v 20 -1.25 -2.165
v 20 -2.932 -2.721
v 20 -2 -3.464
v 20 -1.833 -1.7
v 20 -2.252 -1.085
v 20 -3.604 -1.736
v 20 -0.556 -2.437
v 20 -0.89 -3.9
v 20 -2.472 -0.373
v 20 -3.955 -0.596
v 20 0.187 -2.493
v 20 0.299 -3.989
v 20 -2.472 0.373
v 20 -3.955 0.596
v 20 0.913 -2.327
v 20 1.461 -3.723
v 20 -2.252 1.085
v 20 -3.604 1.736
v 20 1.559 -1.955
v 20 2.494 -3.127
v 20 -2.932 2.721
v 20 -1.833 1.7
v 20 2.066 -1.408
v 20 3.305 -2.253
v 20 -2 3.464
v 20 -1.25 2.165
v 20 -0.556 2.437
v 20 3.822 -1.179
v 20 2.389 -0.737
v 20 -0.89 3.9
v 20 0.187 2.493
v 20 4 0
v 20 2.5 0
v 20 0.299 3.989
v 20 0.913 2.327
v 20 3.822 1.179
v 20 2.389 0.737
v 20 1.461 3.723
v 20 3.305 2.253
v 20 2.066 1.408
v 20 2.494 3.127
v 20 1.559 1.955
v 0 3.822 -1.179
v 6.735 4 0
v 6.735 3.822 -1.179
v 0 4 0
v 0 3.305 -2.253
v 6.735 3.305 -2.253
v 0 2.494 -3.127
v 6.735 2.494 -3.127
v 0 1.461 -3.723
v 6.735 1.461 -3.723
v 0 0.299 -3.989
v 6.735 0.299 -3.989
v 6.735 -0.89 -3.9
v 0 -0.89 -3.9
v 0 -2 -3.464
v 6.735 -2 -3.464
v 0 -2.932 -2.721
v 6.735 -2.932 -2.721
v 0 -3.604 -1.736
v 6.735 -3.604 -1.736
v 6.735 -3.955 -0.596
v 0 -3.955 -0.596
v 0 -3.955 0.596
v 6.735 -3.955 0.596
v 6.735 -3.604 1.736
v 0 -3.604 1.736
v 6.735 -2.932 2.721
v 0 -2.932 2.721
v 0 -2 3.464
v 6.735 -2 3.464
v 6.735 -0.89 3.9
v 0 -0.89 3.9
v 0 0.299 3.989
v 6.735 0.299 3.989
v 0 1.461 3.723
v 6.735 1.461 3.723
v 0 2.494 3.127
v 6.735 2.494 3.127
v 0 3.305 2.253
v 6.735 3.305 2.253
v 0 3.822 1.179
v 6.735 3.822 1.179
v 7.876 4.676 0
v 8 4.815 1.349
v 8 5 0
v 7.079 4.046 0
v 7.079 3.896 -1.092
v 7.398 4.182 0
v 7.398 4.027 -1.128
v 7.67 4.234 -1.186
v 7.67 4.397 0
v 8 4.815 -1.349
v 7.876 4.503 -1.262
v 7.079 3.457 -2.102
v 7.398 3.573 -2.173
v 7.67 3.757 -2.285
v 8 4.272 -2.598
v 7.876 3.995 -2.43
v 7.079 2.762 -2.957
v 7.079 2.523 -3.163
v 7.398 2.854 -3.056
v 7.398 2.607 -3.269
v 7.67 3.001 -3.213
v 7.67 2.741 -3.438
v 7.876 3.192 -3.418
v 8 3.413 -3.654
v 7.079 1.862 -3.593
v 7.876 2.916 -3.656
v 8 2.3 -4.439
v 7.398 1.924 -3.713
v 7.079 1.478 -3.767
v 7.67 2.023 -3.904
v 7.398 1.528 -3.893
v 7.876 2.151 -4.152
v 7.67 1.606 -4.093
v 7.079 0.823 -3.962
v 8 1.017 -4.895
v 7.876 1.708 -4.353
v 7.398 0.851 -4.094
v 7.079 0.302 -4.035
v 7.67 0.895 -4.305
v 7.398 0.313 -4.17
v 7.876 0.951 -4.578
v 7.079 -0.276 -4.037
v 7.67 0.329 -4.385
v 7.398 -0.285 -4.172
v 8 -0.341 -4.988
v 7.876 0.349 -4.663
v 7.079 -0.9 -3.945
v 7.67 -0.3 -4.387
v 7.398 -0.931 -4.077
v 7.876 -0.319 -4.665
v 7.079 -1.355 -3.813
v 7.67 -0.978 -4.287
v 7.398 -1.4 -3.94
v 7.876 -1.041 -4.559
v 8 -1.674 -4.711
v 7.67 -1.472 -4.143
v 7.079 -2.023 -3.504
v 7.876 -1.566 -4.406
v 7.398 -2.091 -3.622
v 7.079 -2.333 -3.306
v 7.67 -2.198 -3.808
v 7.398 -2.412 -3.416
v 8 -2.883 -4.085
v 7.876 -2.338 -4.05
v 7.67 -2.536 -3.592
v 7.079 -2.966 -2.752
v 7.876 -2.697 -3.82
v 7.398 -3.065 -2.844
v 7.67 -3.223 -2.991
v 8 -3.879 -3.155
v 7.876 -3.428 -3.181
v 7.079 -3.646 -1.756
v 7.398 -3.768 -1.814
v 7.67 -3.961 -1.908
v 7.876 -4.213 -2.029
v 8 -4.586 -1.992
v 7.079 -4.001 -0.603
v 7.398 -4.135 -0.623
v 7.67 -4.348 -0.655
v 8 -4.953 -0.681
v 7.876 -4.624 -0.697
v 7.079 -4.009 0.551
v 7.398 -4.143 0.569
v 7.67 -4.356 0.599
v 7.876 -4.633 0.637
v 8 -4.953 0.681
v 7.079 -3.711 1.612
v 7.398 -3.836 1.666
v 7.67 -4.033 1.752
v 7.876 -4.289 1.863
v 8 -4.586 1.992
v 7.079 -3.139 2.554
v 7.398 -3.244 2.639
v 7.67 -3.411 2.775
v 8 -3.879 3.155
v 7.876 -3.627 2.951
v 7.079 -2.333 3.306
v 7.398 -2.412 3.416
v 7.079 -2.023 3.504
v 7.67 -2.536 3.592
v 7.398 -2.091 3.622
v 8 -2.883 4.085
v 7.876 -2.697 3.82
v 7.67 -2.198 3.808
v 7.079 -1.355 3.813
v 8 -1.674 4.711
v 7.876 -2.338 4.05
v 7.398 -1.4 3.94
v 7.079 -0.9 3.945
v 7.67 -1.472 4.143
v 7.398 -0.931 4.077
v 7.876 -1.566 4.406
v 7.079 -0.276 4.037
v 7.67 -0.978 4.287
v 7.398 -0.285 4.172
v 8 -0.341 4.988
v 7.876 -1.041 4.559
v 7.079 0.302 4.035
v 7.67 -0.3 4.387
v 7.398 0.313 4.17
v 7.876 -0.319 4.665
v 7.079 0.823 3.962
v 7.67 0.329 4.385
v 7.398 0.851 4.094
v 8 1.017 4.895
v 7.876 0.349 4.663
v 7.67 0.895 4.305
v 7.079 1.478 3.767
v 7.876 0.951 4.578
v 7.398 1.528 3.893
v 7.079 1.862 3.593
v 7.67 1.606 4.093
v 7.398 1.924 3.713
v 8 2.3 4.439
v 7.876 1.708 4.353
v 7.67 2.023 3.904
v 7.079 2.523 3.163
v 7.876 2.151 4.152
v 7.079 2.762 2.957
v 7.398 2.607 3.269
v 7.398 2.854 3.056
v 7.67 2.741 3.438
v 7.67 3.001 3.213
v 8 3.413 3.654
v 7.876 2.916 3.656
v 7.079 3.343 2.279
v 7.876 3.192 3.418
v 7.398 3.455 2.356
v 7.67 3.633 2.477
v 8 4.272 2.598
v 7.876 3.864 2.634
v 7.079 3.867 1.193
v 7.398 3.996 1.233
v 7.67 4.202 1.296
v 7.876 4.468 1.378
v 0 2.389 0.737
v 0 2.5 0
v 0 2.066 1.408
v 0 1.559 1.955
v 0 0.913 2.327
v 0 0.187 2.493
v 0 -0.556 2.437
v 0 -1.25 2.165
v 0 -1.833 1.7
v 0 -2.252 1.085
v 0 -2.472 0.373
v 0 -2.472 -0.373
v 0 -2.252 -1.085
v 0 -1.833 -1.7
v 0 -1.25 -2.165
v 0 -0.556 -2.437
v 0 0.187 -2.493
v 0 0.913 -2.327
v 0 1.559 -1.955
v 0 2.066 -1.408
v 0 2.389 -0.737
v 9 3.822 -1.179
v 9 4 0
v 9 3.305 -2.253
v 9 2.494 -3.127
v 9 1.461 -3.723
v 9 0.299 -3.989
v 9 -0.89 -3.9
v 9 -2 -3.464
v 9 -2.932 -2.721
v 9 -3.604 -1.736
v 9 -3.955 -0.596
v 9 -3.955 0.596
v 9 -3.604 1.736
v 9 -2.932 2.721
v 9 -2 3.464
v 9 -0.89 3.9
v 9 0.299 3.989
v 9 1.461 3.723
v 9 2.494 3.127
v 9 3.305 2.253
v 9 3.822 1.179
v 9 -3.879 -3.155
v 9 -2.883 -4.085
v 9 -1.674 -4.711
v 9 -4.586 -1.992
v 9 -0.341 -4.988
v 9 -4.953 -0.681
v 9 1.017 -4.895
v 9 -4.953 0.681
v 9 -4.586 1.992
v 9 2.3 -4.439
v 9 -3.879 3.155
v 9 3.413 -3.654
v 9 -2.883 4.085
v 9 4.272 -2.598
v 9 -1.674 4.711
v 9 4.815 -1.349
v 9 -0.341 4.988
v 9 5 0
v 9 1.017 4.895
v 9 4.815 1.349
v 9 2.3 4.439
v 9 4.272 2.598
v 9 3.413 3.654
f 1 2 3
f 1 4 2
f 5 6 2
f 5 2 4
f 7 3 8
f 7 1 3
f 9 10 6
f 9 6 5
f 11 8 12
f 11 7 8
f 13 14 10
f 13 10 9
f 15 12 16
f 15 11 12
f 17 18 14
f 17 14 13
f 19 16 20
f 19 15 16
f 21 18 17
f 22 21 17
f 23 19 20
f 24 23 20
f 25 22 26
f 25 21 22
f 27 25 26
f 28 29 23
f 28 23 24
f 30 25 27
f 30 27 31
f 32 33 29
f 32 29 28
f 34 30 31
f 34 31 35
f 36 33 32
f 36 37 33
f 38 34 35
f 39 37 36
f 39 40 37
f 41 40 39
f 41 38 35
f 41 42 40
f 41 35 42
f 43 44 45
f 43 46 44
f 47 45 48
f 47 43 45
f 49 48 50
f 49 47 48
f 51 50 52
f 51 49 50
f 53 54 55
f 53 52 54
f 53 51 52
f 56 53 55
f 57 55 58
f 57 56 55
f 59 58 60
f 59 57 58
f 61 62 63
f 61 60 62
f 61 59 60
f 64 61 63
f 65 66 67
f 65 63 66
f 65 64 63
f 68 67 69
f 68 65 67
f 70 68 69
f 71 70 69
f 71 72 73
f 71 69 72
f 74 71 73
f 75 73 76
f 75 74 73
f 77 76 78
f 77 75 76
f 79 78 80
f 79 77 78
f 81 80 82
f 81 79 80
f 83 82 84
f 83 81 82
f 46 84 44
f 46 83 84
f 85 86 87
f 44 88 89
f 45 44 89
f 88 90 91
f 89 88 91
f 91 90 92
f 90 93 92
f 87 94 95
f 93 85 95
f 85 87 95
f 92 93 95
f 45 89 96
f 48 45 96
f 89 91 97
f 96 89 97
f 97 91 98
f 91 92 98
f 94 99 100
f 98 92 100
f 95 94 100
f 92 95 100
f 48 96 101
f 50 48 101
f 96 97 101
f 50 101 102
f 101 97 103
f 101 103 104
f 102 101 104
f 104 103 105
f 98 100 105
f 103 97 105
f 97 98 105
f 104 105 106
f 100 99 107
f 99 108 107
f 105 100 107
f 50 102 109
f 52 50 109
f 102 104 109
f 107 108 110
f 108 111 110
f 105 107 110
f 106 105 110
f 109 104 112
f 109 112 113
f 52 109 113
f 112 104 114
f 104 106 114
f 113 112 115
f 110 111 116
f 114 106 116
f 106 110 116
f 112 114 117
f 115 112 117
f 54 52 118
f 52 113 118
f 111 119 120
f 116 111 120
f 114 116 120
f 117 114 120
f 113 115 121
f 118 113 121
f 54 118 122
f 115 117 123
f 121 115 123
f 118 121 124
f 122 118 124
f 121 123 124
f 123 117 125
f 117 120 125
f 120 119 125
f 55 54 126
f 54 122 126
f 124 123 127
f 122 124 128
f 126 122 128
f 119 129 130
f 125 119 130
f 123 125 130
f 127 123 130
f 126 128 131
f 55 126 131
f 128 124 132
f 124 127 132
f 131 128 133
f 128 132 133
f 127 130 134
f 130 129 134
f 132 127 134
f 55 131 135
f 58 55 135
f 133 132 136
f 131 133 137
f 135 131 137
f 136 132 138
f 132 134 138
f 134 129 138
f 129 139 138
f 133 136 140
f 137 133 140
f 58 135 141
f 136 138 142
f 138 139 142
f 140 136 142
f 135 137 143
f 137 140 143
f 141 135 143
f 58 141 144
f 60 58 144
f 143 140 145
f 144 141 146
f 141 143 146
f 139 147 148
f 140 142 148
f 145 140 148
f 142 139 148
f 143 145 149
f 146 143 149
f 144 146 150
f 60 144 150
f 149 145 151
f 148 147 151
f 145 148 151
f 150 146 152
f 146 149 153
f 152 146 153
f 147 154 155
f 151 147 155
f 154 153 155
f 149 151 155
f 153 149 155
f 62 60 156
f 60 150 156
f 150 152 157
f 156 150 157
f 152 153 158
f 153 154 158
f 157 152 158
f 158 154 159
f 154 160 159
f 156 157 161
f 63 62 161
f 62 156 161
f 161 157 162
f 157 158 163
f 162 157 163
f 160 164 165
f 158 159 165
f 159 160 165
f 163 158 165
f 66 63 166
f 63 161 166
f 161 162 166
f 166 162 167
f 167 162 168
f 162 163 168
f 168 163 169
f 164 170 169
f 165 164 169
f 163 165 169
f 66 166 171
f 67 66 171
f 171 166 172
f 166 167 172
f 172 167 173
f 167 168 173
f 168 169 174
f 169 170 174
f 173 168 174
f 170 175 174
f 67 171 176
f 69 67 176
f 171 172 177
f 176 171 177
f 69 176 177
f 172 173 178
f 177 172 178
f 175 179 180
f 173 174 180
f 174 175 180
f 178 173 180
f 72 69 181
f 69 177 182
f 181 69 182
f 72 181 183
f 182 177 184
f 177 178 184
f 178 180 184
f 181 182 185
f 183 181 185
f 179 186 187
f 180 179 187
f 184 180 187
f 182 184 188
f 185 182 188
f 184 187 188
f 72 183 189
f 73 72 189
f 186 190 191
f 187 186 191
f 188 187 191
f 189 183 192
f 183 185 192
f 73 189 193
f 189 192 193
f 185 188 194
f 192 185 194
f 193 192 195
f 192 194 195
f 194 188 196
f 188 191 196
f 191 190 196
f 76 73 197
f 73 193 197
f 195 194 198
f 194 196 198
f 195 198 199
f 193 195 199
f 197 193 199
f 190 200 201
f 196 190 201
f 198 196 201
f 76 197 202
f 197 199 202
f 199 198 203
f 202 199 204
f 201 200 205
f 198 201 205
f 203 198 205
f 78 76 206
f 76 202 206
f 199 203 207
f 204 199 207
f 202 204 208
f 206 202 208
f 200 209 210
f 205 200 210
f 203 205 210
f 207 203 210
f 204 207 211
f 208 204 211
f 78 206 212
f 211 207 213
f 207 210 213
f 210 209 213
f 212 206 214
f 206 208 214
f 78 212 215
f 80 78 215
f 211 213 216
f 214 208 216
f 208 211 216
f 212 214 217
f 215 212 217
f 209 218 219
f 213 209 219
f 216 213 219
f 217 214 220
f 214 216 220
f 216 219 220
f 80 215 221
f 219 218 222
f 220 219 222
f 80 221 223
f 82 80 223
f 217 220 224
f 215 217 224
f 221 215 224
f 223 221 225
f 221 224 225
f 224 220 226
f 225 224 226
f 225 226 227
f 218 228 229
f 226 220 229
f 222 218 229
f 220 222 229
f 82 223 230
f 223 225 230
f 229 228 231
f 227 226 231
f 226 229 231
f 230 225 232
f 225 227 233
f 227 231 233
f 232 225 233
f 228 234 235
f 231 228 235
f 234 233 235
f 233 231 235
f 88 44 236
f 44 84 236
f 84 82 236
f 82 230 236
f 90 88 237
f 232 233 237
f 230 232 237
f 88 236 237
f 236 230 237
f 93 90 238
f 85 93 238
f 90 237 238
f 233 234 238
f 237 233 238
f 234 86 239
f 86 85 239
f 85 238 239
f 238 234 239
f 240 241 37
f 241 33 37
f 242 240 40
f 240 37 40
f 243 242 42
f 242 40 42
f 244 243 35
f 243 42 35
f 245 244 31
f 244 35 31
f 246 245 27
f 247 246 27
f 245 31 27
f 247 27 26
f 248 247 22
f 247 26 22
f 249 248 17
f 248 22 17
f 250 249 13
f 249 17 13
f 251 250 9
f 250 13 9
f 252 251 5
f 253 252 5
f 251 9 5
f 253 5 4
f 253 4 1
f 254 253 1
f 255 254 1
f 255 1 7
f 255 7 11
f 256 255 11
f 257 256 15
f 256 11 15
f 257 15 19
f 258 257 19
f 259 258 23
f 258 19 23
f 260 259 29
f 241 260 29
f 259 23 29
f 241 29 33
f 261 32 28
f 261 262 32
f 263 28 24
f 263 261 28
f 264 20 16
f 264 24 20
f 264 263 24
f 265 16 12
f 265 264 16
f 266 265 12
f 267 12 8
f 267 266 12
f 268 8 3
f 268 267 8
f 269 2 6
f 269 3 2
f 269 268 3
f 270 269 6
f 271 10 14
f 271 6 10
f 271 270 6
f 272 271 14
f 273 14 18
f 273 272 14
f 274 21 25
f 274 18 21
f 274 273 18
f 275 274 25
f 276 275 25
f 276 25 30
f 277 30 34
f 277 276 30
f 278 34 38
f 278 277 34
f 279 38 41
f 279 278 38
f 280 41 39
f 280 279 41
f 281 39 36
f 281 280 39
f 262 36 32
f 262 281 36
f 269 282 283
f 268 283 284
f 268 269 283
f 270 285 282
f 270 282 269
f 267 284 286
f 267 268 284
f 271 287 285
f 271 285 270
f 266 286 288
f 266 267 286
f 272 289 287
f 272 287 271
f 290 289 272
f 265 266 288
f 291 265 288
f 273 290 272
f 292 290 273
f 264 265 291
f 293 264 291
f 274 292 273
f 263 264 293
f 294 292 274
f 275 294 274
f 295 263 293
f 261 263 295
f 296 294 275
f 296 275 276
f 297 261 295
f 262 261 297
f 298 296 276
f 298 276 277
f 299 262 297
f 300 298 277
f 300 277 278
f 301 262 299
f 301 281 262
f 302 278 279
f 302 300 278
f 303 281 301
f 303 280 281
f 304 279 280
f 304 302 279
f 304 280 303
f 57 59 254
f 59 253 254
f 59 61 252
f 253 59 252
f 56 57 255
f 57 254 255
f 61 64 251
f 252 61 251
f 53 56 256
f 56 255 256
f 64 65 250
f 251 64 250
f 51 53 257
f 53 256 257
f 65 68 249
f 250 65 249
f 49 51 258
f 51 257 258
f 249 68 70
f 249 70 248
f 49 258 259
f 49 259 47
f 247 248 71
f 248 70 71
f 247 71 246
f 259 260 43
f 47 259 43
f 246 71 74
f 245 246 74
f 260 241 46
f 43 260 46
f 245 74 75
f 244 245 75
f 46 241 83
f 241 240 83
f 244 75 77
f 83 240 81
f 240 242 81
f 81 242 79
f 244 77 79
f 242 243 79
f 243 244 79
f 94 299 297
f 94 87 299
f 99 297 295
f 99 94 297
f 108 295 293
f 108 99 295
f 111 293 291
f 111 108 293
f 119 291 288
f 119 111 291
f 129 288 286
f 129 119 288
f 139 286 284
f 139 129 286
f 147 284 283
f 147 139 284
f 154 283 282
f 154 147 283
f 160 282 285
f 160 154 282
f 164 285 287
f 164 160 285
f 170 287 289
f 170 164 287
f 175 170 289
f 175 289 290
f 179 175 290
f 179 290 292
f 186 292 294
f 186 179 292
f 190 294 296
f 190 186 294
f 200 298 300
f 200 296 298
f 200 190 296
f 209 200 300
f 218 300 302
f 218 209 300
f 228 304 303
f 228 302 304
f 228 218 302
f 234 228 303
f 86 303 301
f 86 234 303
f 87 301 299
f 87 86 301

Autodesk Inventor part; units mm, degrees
ref_plane "YZ Plane" through (0, 0, 0) normal (1, 0, 0) x (0, 1, 0)
ref_plane "XZ Plane" through (0, 0, 0) normal (0, 1, 0) x (-1, 0, 0)
ref_plane "XY Plane" through (0, 0, 0) normal (0, 0, 1) x (1, 0, 0)
sketch "Skizze1" plane through (0, 0, 0) normal (0, 0, 1) x (1, 0, 0)
  line L0 (-4, 0) -> (24, 0) projected
  line L1 (0, -1) -> (0, 6) projected
  line L2 (0, 2.5) -> (20, 2.5)
  line L3 (20, 2.5) -> (20, 4)
  line L4 (20, 4) -> (9, 4)
  line L5 (9, 4) -> (9, 5)
  line L6 (9, 5) -> (8, 5)
  line L7 (8, 5) -> (8, 4)
  line L8 (8, 4) -> (0, 4)
  line L9 (0, 4) -> (0, 2.5)
  point P0 (0, 0)
  dimension "d0" = 10
  dimension "d1" = 8
  dimension "d2" = 8
  dimension "d3" = 11
  dimension "d4" = 5
  dimension "d5" = 20
revolve "Umdrehung1" add sketch "Skizze1" angle 360 about axis through (-10, 0, 0) along (1, 0, 0)
fillet "Rundung1" radius 1.3 1 edges at (8, -4, 0)
properties part number "Lagerbuchse"
